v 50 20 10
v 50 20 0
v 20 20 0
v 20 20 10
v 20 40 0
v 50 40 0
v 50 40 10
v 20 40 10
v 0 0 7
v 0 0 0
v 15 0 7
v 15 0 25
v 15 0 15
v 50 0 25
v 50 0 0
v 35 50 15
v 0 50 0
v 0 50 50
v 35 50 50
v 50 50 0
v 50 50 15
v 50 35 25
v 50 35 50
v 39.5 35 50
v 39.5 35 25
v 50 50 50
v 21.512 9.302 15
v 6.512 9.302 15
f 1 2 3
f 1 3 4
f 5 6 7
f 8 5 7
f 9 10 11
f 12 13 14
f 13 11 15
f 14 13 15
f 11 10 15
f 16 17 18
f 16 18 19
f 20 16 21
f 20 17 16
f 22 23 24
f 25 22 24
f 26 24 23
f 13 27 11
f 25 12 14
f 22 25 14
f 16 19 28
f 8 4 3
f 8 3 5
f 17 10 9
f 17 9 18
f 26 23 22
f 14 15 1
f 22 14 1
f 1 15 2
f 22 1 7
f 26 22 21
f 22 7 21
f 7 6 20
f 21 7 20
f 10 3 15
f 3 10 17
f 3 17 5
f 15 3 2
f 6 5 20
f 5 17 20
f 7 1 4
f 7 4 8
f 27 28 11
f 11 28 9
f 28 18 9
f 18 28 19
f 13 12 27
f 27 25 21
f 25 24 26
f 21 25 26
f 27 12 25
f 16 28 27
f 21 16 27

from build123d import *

# Parameters (mm, degrees)
F0_W      = 50
F0_H      = 50
F1_DEPTH  = 50
F2_W      = 20
F2_H      = 10
F3_DEPTH  = 30
F8_DEPTH  = 35
F10_DEPTH = 25
F12_REACH = 115.9479483752


with BuildPart() as f1:
    # F0 (on Top) → F1 (new body)
    with BuildSketch(Plane.XY):
        with Locations((25, 25)):
            Rectangle(F0_W, F0_H)
    extrude(amount=F1_DEPTH)

    # F2 (on face) → F3 (cut)
    with BuildSketch(Plane.YZ.offset(50)):
        with Locations((30, 5)):
            Rectangle(F2_W, F2_H)
    extrude(amount=-F3_DEPTH, mode=Mode.SUBTRACT)

    # F7 (on face) → F8 (cut)
    with BuildSketch(Plane.XY.offset(50)):
        Polygon((15, 0), (50, 50), (35, 50), (0, 0), align=None)
    extrude(amount=-F8_DEPTH, mode=Mode.SUBTRACT)

    # F9 (on face) → F10 (cut)
    with BuildSketch(Plane.XY.offset(50)):
        Polygon((15, 0), (50, 0), (50, 35), (39.5, 35), align=None)
    extrude(amount=-F10_DEPTH, mode=Mode.SUBTRACT)

    f12_end = Plane(origin=(37.75, 32.5, 27.5), x_dir=(-0.5734623444, -0.8192319205, 0), z_dir=(-0.8192319205, 0.5734623444, 0))
    # F11 (on face) → F12 (cut, up to a plane its end follows)
    with BuildSketch(Plane(origin=(0, 0, 0), x_dir=(0, -1, 0), z_dir=(-1, 0, 0))):
        Polygon((0, 50), (-50, 50), (0, 7), align=None)
    f12_long = extrude(amount=-F12_REACH, mode=Mode.PRIVATE)
    add(split(f12_long, bisect_by=f12_end, keep=Keep.TOP, mode=Mode.PRIVATE), mode=Mode.SUBTRACT)


solid = f1.part
